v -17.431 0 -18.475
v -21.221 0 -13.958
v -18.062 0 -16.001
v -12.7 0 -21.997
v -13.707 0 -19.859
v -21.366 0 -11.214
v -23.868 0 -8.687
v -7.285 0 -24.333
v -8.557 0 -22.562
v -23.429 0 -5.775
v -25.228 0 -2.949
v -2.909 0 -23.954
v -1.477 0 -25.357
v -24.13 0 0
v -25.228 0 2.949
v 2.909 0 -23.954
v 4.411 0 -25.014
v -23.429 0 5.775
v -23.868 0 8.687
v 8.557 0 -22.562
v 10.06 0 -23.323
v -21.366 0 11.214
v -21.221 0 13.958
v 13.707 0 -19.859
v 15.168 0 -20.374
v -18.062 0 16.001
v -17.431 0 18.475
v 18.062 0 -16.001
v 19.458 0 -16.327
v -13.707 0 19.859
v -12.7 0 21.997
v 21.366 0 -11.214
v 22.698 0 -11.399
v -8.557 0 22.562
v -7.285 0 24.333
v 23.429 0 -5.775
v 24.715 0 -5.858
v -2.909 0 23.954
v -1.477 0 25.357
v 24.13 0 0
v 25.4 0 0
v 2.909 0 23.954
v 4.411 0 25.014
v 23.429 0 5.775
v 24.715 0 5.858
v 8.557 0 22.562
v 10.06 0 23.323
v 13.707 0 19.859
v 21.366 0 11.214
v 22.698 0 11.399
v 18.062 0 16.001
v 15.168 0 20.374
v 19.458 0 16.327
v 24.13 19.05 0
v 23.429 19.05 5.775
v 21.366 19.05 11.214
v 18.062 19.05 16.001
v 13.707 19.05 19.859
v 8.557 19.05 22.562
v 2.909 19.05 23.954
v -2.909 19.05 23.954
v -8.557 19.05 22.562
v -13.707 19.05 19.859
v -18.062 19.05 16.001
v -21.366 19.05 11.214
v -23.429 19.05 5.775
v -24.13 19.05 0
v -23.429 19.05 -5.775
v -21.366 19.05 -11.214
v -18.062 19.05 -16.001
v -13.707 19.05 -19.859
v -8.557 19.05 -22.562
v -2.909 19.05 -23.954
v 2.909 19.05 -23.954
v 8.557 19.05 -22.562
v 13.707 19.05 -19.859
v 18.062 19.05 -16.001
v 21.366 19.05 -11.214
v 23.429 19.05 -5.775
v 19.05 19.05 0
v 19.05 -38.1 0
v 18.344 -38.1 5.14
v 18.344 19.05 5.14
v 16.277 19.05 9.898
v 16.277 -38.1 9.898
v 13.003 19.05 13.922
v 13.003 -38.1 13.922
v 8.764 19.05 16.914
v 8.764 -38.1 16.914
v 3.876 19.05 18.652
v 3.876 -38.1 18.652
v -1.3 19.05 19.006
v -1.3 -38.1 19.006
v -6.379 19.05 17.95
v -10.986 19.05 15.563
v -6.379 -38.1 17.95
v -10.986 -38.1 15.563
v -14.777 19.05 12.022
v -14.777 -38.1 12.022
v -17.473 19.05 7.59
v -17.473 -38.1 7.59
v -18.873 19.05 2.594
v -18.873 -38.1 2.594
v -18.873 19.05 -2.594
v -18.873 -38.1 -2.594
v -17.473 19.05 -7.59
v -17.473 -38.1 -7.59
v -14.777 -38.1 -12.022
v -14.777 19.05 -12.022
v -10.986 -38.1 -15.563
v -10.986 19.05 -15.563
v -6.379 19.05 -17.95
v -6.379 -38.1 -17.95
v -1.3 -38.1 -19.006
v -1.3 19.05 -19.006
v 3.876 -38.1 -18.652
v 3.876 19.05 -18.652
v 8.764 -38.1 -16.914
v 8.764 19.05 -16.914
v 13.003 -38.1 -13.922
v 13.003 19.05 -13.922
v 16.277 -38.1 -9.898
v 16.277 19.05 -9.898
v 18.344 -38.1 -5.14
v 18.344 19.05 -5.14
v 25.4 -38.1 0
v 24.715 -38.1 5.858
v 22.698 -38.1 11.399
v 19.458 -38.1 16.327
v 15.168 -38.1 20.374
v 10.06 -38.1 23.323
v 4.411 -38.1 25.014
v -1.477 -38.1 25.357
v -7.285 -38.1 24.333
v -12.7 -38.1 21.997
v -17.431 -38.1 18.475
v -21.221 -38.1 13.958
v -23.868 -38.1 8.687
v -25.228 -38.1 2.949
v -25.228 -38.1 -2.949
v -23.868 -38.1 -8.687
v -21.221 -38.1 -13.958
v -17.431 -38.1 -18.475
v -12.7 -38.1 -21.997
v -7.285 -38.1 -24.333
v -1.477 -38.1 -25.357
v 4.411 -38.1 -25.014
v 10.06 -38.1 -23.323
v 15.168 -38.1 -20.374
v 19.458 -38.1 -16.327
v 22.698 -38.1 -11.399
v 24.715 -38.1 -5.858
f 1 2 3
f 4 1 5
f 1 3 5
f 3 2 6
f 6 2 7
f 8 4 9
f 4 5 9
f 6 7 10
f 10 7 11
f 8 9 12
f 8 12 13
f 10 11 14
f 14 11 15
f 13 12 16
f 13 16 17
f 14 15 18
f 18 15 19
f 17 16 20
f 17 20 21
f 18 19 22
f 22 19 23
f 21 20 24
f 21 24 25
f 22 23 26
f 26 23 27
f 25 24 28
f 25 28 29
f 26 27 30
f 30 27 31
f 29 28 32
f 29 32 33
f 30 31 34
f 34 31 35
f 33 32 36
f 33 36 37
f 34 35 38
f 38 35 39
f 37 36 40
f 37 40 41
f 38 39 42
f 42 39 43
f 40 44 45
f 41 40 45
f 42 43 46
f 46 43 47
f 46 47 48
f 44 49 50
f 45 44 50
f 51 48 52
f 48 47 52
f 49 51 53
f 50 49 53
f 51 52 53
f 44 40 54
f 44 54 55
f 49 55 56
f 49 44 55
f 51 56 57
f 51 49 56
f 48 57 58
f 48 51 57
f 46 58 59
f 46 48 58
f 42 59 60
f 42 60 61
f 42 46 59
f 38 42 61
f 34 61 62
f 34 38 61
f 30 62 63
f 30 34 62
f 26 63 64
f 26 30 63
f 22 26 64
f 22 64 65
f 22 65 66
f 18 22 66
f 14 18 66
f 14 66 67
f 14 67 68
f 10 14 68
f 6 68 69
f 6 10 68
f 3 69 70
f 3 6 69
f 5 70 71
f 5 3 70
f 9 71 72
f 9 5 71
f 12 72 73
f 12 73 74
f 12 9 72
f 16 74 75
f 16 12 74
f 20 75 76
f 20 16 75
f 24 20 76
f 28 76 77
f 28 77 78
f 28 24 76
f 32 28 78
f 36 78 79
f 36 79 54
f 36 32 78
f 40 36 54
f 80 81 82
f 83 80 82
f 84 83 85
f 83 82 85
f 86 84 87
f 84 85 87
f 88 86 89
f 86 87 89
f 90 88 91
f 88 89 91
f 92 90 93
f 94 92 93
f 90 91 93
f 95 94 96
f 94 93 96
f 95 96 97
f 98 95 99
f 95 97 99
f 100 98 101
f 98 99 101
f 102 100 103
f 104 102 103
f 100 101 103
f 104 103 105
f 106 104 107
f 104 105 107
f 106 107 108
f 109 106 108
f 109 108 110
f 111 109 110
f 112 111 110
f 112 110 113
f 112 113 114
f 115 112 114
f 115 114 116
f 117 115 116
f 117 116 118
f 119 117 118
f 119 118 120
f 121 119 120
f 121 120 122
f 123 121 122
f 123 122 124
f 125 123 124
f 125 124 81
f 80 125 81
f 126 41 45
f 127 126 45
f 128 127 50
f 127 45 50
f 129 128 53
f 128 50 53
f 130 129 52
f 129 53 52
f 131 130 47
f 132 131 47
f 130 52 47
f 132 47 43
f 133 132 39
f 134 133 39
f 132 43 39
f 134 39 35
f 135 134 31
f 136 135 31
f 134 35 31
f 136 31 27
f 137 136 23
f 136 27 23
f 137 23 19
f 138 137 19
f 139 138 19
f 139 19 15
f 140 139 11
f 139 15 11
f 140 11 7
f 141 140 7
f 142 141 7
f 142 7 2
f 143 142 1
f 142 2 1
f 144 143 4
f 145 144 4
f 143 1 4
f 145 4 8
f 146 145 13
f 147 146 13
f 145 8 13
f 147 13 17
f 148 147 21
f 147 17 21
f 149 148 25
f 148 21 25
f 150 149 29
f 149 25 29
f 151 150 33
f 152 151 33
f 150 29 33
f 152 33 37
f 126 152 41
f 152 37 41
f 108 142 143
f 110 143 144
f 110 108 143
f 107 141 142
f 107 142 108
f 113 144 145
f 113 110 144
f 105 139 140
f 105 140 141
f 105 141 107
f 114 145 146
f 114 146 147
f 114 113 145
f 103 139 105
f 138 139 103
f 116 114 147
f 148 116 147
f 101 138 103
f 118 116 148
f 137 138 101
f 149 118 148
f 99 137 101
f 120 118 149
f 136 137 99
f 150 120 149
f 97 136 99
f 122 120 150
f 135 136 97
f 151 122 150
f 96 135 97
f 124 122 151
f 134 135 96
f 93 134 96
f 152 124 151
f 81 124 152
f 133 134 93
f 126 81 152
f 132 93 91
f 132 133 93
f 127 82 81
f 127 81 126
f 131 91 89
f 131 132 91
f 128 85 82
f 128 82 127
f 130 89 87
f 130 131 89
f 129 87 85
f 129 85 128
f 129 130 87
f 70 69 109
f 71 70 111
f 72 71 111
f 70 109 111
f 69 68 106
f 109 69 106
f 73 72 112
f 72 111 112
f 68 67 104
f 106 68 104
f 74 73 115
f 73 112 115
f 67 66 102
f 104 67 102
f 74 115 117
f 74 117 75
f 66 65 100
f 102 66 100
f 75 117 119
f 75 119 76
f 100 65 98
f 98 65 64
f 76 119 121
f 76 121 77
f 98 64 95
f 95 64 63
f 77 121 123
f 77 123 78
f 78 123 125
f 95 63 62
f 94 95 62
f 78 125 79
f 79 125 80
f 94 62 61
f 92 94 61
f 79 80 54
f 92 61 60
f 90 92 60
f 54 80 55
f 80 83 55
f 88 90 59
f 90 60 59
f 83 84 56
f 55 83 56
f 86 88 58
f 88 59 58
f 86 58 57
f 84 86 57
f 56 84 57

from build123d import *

# Parameters (mm, degrees)
F0_R     = 24.13
F1_DEPTH = 19.05
F2_R     = 25.4
F3_DEPTH = 38.1
F4_R     = 19.05
F5_DEPTH = 57.151


with BuildPart() as f1:
    # F0 (on Front) → F1 (new body)
    with BuildSketch(Plane.XZ):
        Circle(F0_R)
    extrude(amount=-F1_DEPTH)

    # F2 (on face) → F3 (join)
    with BuildSketch(Plane.XZ):
        Circle(F2_R)
    extrude(amount=F3_DEPTH)

    # F4 (on face) → F5 (cut, through all)
    with BuildSketch(Plane.XZ.offset(38.1)):
        Circle(F4_R)
    extrude(amount=-F5_DEPTH, mode=Mode.SUBTRACT)


solid = f1.part
